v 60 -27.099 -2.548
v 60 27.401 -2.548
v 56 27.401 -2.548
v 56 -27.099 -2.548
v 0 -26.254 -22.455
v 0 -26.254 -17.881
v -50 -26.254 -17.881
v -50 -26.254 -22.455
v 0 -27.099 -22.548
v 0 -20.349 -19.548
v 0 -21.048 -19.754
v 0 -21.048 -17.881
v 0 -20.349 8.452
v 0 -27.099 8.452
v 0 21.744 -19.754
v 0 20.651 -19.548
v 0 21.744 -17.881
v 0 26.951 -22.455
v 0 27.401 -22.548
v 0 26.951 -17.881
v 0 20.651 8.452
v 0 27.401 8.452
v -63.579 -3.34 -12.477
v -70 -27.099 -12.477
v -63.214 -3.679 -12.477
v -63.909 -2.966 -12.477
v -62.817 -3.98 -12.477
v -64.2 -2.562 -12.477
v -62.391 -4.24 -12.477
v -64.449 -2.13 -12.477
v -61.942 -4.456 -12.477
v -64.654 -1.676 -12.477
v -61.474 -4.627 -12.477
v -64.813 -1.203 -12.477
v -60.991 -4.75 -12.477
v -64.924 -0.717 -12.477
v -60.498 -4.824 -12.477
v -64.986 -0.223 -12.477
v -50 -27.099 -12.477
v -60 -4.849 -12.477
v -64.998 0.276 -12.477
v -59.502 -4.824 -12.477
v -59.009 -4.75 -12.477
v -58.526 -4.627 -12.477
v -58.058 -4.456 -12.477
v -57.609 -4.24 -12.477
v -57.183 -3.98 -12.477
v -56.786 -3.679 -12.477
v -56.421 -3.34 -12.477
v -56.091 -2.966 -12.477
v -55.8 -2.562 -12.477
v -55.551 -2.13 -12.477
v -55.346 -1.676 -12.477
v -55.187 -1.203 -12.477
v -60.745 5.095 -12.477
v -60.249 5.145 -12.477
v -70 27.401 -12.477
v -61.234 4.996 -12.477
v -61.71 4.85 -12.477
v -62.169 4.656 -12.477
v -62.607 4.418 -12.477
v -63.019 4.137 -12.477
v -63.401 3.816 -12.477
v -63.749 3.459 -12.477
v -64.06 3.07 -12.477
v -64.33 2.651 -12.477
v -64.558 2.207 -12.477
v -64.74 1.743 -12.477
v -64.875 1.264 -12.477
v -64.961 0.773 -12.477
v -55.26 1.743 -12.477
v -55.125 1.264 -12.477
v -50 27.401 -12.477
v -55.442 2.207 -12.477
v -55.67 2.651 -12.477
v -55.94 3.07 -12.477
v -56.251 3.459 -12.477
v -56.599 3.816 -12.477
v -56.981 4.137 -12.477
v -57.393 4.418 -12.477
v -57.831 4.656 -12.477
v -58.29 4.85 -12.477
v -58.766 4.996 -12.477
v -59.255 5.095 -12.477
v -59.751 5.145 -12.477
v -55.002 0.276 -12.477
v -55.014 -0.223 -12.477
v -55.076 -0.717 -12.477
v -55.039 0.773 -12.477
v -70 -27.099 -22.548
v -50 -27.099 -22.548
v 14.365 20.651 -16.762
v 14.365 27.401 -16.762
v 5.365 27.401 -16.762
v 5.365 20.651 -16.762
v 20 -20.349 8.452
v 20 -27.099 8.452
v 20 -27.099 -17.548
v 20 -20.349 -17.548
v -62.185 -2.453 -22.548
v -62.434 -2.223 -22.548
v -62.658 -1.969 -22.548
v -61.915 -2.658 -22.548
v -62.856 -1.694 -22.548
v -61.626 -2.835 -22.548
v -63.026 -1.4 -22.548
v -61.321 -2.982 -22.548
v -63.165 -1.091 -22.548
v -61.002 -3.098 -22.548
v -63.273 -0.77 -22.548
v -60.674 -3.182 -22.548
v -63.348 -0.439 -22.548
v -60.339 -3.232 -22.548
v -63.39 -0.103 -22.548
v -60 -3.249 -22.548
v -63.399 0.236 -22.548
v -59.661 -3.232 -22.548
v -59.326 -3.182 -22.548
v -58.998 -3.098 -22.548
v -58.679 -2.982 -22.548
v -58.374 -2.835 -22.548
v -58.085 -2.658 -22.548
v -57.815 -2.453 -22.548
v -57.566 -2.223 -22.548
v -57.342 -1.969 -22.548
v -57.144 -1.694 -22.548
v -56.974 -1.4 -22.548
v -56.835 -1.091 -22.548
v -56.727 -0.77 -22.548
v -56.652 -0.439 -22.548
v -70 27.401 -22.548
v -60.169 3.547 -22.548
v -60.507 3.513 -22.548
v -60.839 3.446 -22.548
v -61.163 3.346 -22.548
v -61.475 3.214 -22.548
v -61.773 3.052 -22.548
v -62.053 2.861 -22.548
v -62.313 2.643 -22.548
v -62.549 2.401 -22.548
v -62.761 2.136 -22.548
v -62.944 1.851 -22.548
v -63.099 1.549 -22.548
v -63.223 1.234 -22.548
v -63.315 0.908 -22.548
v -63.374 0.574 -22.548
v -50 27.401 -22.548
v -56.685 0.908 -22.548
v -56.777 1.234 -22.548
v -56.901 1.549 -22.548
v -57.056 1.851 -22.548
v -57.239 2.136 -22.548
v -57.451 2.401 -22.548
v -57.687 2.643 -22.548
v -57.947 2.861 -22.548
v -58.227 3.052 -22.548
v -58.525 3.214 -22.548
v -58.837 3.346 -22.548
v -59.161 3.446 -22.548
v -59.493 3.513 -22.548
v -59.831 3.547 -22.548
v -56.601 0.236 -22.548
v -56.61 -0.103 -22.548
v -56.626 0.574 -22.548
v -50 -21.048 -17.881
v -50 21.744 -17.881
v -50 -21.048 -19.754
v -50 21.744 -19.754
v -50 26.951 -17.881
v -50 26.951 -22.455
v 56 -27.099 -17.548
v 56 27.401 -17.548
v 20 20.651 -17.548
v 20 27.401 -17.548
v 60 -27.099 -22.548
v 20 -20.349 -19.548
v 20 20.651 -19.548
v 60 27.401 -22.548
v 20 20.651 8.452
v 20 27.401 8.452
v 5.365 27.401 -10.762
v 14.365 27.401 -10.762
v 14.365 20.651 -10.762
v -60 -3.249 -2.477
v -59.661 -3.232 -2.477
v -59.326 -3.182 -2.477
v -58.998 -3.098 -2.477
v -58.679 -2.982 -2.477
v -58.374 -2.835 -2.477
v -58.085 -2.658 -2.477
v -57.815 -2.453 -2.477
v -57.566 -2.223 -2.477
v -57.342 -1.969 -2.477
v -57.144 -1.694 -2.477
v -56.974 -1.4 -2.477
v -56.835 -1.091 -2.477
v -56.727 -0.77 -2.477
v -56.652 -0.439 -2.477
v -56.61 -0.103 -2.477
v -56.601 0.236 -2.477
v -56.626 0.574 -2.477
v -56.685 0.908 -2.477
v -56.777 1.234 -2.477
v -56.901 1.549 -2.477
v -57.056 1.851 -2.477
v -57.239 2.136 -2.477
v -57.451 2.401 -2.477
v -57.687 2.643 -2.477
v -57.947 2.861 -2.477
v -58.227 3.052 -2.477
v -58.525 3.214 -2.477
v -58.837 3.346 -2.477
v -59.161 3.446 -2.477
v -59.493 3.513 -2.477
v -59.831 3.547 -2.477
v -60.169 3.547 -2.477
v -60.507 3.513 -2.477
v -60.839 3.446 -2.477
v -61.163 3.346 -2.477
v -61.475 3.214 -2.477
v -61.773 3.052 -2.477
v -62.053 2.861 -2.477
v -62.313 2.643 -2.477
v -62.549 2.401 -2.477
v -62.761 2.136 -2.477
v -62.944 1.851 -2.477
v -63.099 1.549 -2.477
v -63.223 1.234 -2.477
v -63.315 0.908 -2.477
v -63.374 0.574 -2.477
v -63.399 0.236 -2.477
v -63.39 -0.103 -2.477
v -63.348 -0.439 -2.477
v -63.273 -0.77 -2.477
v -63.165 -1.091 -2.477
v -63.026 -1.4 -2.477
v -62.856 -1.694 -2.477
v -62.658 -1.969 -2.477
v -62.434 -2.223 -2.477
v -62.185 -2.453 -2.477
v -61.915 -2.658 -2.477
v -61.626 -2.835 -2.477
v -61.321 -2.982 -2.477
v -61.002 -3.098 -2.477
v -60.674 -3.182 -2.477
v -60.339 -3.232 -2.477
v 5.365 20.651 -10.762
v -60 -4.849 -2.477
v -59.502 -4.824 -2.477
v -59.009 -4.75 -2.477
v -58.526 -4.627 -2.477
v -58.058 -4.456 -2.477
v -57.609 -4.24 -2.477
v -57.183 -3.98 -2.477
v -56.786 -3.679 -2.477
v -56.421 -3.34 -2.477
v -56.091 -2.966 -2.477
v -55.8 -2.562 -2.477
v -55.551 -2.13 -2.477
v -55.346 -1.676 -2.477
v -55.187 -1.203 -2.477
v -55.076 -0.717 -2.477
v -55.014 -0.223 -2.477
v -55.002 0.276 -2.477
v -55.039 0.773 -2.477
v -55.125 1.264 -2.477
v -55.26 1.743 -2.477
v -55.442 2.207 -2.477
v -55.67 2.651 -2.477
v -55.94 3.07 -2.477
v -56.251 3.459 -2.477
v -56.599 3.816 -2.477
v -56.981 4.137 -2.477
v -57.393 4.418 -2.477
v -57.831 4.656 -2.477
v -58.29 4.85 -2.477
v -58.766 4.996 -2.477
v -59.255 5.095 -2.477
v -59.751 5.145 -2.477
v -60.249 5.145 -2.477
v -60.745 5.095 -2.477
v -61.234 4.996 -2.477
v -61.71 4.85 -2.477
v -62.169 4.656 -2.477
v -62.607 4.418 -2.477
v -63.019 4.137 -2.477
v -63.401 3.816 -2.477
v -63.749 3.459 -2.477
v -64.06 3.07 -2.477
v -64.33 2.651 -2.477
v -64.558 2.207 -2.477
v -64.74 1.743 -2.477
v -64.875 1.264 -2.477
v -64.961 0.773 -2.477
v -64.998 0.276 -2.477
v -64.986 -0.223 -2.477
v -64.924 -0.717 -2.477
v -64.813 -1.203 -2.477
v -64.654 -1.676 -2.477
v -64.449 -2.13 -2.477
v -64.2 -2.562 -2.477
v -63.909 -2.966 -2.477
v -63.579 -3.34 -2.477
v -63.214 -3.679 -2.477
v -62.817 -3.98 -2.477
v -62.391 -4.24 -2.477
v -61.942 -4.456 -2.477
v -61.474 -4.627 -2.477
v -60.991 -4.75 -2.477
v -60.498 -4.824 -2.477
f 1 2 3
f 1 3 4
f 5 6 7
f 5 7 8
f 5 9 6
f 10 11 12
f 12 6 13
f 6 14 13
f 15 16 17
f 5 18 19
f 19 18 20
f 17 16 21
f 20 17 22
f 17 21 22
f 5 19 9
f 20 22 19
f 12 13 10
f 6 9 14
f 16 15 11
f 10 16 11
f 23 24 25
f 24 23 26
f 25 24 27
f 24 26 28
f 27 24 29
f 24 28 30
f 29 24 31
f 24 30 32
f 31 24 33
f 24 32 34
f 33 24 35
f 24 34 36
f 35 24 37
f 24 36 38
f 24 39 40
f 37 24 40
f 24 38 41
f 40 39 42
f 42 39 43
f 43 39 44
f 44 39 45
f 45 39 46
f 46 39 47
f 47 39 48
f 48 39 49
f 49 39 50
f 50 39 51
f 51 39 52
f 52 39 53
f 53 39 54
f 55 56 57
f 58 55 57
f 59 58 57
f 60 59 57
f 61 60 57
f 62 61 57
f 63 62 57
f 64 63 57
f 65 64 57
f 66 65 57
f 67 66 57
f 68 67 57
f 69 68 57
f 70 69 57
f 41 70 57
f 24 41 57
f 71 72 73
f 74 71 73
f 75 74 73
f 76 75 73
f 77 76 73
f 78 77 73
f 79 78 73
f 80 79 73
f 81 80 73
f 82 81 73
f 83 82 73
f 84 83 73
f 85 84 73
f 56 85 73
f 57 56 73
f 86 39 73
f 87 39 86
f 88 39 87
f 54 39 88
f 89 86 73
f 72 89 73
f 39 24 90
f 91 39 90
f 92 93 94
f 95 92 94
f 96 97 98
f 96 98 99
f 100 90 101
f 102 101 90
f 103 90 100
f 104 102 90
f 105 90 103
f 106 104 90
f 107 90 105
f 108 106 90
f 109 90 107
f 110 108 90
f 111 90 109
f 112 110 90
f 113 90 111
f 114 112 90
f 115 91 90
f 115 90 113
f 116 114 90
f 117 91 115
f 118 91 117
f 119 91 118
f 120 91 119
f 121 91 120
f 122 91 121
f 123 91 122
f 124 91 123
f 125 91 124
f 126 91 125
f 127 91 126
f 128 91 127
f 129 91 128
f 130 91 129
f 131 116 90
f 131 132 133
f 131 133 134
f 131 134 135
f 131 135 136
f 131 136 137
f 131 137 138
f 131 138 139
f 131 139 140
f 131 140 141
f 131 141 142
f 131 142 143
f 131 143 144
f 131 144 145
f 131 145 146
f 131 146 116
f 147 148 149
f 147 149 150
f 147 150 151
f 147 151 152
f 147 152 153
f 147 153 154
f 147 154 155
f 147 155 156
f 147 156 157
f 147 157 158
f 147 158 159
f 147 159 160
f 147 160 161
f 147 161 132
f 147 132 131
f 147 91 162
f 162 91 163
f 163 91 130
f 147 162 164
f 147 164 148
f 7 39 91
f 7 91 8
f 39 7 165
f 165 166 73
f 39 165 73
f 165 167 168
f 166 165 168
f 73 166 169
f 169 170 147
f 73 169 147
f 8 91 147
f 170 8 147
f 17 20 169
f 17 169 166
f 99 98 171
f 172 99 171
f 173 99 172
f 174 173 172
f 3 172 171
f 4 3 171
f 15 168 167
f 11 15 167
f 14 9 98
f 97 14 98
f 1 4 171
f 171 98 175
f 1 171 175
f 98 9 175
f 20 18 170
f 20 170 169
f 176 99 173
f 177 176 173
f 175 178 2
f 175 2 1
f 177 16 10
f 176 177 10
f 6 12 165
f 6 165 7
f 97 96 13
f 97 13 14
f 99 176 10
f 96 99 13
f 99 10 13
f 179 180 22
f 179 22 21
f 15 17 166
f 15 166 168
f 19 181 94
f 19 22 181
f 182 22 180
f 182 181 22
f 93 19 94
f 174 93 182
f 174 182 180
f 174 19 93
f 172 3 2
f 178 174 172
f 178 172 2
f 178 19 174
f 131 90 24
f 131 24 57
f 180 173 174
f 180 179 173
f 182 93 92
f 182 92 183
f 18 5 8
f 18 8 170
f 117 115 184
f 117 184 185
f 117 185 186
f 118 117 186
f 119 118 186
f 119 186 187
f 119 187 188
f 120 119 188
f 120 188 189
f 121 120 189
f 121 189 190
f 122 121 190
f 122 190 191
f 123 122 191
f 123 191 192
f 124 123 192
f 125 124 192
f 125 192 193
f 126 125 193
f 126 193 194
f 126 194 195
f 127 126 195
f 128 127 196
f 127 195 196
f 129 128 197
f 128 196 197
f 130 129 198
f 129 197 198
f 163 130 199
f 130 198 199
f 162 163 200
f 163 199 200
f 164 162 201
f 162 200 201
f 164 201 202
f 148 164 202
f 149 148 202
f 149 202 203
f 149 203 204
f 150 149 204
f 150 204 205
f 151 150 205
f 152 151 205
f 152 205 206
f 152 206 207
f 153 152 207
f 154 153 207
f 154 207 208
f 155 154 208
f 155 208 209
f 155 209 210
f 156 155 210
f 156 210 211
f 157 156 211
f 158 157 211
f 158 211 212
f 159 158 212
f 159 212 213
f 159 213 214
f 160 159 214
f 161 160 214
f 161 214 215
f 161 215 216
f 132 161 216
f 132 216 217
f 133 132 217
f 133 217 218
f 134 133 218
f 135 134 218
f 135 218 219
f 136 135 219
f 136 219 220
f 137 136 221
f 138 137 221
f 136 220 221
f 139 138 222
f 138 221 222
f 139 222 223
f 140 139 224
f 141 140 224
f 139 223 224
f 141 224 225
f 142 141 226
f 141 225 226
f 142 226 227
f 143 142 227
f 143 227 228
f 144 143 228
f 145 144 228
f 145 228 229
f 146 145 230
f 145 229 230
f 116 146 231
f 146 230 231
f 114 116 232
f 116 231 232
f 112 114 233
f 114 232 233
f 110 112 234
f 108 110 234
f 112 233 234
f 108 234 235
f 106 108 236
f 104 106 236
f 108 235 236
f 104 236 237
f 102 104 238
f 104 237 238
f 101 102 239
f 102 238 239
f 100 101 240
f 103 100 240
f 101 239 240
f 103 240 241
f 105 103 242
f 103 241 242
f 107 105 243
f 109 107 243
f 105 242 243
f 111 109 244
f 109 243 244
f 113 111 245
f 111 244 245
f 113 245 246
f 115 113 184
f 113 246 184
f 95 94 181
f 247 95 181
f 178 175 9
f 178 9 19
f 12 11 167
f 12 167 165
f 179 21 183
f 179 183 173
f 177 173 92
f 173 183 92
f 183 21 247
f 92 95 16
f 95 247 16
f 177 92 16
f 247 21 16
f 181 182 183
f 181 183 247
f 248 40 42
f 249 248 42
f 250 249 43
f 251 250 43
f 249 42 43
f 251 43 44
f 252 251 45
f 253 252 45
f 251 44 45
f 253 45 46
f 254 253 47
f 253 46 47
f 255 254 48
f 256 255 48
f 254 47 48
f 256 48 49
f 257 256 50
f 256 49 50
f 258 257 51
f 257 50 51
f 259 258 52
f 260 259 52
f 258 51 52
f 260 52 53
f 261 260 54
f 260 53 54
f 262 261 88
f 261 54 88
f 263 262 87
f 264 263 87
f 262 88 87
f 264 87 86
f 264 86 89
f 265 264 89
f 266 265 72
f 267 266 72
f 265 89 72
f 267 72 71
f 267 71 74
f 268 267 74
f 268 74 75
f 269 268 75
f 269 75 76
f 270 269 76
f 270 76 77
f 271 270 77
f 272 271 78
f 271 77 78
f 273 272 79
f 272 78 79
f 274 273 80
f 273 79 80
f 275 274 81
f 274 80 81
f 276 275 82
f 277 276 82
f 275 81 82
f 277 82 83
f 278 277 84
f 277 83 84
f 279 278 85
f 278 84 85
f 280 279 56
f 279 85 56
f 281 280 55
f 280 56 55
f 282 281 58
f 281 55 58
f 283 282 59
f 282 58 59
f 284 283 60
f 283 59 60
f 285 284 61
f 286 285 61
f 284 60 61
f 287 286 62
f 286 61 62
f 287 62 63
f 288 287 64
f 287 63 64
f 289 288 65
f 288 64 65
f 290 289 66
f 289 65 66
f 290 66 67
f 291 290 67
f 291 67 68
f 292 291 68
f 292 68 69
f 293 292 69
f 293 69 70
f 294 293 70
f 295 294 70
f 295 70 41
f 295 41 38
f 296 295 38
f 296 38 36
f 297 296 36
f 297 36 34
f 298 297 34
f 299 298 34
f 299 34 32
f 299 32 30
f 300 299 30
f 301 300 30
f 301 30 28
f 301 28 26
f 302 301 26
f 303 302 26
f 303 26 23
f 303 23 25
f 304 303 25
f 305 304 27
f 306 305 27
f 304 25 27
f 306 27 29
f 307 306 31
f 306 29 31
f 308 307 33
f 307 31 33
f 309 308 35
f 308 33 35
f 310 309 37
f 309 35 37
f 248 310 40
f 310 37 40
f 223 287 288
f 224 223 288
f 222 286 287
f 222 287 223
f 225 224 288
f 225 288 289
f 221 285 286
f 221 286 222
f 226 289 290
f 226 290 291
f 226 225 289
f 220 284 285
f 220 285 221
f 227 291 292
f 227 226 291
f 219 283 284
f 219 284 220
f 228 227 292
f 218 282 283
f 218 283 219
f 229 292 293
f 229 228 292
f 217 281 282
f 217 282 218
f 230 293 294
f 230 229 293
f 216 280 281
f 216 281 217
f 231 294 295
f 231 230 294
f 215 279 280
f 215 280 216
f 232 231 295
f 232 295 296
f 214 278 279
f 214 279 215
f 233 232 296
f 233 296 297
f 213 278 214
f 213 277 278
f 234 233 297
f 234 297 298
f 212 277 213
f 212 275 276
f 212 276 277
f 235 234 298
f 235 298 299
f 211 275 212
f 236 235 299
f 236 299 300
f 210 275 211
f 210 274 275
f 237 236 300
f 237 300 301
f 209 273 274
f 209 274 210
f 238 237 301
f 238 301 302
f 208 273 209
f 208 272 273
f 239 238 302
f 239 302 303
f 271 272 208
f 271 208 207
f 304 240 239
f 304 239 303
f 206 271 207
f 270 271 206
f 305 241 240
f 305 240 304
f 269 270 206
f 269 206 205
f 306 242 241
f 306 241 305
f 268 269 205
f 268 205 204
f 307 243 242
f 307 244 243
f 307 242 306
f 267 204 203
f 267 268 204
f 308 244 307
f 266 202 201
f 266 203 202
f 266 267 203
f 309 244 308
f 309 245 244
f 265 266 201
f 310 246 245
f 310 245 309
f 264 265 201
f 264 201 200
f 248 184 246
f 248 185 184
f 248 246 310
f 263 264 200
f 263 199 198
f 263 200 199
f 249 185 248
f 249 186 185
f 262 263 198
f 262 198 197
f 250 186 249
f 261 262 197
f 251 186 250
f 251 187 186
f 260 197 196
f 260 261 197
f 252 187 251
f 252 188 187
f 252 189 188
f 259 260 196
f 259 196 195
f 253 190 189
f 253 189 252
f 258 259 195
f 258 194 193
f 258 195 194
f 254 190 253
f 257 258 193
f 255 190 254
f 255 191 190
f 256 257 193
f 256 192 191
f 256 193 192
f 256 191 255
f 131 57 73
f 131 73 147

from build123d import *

# Parameters (mm, degrees)
PAD001_DEPTH    = 20
SKETCH004_W     = 9
SKETCH004_H     = 6
POCKET001_DEPTH = 8
PAD006_DEPTH    = 50
SKETCH013_W     = 54.5
SKETCH013_H     = 10.071398
PAD007_DEPTH    = 20
SKETCH014_R     = 5
PAD008_DEPTH    = 10
SKETCH015_R     = 3.4
POCKET005_DEPTH = 25
SKETCH016_W     = 54.5
SKETCH016_H     = 5
PAD009_DEPTH    = 40
SKETCH017_W     = 54.5
SKETCH017_H     = 4
PAD010_DEPTH    = 15


with BuildPart() as part:
    # Sketch002 → Pad001 (new body)
    with BuildSketch(Plane.YZ):
        Polygon((-27.098937, -22.548221), (27.401063, -22.548221), (27.401063, 8.451779), (20.651063, 8.451779), (20.651063, -19.548221), (-20.348937, -19.548221), (-20.348937, 8.451779), (-27.098937, 8.451779), align=None)
    extrude(amount=PAD001_DEPTH)

    # Sketch004 → Pocket001 (cut)
    with BuildSketch(Plane(origin=(0, 27.401063, 0), x_dir=(-1, 0, 0), z_dir=(0, 1, 0))):
        with Locations((-9.865053, -13.762334)):
            Rectangle(SKETCH004_W, SKETCH004_H)
    extrude(amount=-POCKET001_DEPTH, mode=Mode.SUBTRACT)

    # Sketch003 (on Face4 of Pocket001) → Pad006 (join)
    with BuildSketch(Plane(origin=(0, 0, 0), x_dir=(0, 1, 0), z_dir=(-1, 0, 0))):
        Polygon((-21.047689, 17.881043), (-26.254499, 17.881043), (-26.254499, 22.454655), (26.951211, 22.454655), (26.951211, 17.881043), (21.744401, 17.881043), (21.744401, 19.754328), (-21.047689, 19.754328), align=None)
    extrude(amount=PAD006_DEPTH)

    # Sketch013 (on Face23 of Pad006) → Pad007 (join)
    with BuildSketch(Plane(origin=(-50, 0, 0), x_dir=(0, 1, 0), z_dir=(-1, 0, 0))):
        with Locations((0.151063, 17.512522)):
            Rectangle(SKETCH013_W, SKETCH013_H)
    extrude(amount=PAD007_DEPTH)

    # Sketch014 (on Face6 of Pad007) → Pad008 (join)
    with BuildSketch(Plane(origin=(0, 0, -12.476823), x_dir=(0, -1, 0), z_dir=(0, 0, 1))):
        with Locations((-0.151063, -60)):
            Circle(SKETCH014_R)
    extrude(amount=PAD008_DEPTH)

    # Sketch015 (on Face17 of Pad008) → Pocket005 (cut)
    with BuildSketch(Plane(origin=(0, 0, -2.476823), x_dir=(0, -1, 0), z_dir=(0, 0, 1))):
        with Locations((-0.151063, -60)):
            Circle(SKETCH015_R)
    extrude(amount=-POCKET005_DEPTH, mode=Mode.SUBTRACT)

    # Sketch016 (on Face27 of Pocket005) → Pad009 (join)
    with BuildSketch(Plane.YZ.offset(20)):
        with Locations((0.151063, -20.048221)):
            Rectangle(SKETCH016_W, SKETCH016_H)
    extrude(amount=PAD009_DEPTH)

    # Sketch017 (on Face37 of Pad009) → Pad010 (join)
    with BuildSketch(Plane(origin=(0, 0, -17.548221), x_dir=(0, -1, 0), z_dir=(0, 0, 1))):
        with Locations((-0.151063, 58)):
            Rectangle(SKETCH017_W, SKETCH017_H)
    extrude(amount=PAD010_DEPTH)


solid = part.part
